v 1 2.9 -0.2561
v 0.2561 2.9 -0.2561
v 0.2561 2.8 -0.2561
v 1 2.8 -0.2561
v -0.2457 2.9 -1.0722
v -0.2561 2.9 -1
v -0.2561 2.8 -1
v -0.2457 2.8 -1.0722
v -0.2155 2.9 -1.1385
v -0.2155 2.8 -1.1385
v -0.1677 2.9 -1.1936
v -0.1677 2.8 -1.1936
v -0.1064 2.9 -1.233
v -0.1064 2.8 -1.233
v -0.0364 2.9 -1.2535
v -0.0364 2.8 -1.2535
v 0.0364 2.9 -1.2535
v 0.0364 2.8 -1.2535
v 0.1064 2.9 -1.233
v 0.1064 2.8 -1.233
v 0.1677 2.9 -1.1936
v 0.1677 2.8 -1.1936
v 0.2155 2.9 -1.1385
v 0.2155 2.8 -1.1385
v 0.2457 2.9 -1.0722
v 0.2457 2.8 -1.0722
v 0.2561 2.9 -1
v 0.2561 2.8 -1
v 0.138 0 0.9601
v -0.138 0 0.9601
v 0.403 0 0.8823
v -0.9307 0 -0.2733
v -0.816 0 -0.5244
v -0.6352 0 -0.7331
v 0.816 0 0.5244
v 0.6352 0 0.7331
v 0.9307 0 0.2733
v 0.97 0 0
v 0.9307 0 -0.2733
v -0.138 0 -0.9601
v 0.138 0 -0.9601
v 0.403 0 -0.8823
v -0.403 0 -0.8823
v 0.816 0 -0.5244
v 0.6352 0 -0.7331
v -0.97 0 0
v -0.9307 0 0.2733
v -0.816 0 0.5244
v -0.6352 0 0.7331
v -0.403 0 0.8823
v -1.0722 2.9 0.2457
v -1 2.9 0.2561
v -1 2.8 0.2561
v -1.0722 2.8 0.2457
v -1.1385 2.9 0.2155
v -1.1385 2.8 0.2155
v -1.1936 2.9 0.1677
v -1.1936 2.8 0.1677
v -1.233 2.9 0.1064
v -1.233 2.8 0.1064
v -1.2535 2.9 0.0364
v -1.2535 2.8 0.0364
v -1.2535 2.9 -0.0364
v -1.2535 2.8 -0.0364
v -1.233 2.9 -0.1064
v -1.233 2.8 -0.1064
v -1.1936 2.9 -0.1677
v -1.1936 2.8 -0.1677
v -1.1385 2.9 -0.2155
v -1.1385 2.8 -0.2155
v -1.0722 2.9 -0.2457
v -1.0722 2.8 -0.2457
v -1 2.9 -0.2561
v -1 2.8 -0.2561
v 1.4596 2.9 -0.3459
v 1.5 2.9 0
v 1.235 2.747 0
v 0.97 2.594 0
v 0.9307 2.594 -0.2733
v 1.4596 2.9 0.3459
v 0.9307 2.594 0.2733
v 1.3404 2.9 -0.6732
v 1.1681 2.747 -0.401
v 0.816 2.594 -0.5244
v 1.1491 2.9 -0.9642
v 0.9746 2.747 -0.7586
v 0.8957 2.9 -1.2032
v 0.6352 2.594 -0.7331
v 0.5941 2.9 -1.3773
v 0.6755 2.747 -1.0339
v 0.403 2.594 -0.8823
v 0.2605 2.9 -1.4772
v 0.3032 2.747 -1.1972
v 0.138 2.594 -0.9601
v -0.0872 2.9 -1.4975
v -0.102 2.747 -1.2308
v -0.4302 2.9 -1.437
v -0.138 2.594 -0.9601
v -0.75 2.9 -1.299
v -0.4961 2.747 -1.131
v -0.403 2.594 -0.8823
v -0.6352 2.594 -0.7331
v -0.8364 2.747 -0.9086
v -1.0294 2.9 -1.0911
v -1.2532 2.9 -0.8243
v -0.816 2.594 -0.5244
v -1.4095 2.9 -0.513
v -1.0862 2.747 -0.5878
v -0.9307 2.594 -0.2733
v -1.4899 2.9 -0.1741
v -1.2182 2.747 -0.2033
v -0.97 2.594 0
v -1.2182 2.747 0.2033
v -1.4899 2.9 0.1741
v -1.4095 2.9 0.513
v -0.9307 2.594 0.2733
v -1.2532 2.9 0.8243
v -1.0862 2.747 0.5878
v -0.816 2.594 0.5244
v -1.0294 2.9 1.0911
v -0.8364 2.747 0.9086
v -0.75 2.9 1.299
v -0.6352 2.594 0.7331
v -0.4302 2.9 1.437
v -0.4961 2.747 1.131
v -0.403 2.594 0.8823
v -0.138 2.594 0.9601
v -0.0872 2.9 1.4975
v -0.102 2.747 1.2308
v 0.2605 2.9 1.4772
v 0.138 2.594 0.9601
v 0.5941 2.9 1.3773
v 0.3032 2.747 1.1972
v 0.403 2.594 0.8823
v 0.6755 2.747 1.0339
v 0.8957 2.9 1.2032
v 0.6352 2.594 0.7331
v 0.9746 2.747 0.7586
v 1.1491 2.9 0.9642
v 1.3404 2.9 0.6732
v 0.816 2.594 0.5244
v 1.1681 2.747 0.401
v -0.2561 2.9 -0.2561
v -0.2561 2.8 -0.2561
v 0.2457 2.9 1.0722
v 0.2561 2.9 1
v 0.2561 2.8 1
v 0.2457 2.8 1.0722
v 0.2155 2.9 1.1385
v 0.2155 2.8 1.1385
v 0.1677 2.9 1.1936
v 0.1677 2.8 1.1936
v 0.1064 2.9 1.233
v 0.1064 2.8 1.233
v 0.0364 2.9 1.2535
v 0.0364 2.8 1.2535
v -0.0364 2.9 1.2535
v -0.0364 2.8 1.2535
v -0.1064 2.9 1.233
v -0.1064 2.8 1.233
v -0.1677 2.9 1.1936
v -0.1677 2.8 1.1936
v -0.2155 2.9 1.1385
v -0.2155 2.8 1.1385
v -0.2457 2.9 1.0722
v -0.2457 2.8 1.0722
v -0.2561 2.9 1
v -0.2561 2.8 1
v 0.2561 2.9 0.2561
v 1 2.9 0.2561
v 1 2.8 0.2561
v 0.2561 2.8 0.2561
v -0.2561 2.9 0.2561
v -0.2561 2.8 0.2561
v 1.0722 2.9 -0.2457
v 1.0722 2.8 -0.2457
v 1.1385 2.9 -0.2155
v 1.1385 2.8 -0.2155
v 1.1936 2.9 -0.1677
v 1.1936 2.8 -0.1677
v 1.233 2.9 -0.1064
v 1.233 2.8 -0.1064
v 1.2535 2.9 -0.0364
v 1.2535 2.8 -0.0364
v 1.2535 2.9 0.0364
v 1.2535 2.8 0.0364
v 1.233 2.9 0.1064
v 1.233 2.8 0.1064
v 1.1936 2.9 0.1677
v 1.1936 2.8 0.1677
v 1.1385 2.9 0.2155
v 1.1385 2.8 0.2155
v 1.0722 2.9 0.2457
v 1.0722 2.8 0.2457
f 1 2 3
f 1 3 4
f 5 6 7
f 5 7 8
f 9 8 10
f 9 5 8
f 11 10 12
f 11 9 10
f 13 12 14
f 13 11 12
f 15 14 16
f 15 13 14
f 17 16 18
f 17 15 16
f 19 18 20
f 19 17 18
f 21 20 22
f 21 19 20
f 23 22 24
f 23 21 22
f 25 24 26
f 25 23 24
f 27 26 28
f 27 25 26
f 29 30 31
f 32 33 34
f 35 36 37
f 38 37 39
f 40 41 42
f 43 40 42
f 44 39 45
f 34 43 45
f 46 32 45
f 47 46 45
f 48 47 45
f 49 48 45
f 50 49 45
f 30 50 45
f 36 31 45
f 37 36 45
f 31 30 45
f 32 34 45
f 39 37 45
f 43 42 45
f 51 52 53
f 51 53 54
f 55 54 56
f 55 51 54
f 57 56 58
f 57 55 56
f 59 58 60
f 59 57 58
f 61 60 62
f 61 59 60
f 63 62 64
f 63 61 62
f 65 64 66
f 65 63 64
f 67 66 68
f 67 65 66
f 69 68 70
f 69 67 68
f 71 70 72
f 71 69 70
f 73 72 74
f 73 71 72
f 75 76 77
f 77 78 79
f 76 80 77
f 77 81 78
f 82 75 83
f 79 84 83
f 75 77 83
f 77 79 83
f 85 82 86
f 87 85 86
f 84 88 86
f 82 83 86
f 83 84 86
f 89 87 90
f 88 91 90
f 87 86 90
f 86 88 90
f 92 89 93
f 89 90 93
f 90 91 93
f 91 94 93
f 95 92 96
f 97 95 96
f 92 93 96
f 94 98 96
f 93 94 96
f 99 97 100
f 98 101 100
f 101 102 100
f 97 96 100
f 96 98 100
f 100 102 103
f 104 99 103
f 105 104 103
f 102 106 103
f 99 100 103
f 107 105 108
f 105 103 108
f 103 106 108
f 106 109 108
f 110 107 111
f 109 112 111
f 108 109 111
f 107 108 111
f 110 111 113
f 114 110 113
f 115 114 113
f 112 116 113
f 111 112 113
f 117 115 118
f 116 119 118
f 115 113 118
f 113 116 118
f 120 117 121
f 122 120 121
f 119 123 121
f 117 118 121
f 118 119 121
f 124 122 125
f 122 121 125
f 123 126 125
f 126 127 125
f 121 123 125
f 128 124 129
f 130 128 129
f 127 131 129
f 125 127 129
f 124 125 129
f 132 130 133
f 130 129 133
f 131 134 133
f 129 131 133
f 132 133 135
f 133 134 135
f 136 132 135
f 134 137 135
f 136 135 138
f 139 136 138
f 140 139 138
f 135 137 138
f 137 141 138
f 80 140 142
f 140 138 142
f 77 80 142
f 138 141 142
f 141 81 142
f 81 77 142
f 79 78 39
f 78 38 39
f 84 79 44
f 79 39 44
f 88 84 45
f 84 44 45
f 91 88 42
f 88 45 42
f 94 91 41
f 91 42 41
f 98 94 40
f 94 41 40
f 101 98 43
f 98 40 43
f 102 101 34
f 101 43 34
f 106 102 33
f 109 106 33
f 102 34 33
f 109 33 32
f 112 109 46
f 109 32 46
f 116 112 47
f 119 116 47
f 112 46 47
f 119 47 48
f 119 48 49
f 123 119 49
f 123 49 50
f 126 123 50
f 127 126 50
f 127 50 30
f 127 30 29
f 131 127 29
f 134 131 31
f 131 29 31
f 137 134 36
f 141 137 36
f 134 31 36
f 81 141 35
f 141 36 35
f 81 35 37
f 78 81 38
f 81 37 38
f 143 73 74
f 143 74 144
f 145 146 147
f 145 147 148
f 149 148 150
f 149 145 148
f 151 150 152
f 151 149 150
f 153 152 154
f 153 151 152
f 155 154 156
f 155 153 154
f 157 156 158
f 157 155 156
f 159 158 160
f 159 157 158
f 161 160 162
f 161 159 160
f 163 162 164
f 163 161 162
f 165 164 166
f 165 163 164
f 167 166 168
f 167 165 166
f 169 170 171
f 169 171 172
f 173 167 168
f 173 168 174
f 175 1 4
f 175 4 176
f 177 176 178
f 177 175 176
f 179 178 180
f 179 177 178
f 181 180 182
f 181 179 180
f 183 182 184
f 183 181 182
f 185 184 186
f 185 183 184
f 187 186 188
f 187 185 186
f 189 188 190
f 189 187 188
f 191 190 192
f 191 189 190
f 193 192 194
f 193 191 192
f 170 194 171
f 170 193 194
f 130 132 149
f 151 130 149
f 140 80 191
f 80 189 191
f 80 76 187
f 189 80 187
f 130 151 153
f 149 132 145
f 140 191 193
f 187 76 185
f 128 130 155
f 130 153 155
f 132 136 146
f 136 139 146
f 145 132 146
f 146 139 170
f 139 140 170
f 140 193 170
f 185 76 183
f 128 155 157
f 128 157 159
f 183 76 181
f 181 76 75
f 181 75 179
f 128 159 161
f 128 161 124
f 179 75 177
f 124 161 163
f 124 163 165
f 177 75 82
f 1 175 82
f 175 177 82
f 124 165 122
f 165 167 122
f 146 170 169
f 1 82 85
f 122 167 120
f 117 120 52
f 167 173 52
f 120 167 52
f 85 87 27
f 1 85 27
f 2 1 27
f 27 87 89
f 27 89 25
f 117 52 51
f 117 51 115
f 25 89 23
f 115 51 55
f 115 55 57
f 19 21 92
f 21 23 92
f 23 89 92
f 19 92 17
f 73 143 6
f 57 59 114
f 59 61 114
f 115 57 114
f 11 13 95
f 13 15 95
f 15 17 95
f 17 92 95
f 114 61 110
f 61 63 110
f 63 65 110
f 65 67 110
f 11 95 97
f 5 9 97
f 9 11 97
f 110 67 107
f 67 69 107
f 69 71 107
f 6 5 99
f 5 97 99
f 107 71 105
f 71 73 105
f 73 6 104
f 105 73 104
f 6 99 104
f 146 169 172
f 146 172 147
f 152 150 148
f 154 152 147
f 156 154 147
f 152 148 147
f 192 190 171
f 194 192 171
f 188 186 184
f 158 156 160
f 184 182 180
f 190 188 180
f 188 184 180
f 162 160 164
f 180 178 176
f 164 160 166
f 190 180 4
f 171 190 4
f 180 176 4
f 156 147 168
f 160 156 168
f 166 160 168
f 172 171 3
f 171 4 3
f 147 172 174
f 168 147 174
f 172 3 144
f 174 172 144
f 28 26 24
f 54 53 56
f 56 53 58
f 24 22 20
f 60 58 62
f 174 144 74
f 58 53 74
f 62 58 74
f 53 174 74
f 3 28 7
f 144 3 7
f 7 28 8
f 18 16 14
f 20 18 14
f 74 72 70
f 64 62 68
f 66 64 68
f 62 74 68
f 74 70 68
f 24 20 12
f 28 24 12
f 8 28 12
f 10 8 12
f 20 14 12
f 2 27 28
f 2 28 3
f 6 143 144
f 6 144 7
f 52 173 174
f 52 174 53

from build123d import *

# Parameters (mm, degrees)
CUT_EXTRUDE1_DEPTH = 0.1


with BuildPart() as part:
    # Sketch1 → Revolve1 (revolve)
    with BuildSketch(Plane.XY):
        Polygon((0, 2.9), (1.5, 2.9), (0.97, 2.594004357), (0.97, 0), (0, 0), align=None)
    revolve(axis=Axis((0, 0, 0), (0, 1, 0)))

    # Sketch2 → Cut-Extrude1 (cut)
    with BuildSketch(Plane(origin=(0, 2.9, 0), x_dir=(1, 0, 0), z_dir=(0, 1, 0))):
        with BuildLine():
            Line((0.256120786, 1), (0.256120786, 0.256120786))
            Line((0.256120786, 0.256120786), (1, 0.256120786))
            ThreePointArc((1, 0.256120786), (1.256120786, 0), (1, -0.256120786))
            Line((1, -0.256120786), (0.256120786, -0.256120786))
            Line((0.256120786, -0.256120786), (0.256120786, -1))
            ThreePointArc((0.256120786, -1), (0, -1.256120786), (-0.256120786, -1))
            Line((-0.256120786, -1), (-0.256120786, -0.256120786))
            Line((-0.256120786, -0.256120786), (-1, -0.256120786))
            ThreePointArc((-1, -0.256120786), (-1.256120786, 0), (-1, 0.256120786))
            Line((-1, 0.256120786), (-0.256120786, 0.256120786))
            Line((-0.256120786, 0.256120786), (-0.256120786, 1))
            ThreePointArc((-0.256120786, 1), (0, 1.256120786), (0.256120786, 1))
        make_face()
    extrude(amount=-CUT_EXTRUDE1_DEPTH, mode=Mode.SUBTRACT)


solid = part.part
